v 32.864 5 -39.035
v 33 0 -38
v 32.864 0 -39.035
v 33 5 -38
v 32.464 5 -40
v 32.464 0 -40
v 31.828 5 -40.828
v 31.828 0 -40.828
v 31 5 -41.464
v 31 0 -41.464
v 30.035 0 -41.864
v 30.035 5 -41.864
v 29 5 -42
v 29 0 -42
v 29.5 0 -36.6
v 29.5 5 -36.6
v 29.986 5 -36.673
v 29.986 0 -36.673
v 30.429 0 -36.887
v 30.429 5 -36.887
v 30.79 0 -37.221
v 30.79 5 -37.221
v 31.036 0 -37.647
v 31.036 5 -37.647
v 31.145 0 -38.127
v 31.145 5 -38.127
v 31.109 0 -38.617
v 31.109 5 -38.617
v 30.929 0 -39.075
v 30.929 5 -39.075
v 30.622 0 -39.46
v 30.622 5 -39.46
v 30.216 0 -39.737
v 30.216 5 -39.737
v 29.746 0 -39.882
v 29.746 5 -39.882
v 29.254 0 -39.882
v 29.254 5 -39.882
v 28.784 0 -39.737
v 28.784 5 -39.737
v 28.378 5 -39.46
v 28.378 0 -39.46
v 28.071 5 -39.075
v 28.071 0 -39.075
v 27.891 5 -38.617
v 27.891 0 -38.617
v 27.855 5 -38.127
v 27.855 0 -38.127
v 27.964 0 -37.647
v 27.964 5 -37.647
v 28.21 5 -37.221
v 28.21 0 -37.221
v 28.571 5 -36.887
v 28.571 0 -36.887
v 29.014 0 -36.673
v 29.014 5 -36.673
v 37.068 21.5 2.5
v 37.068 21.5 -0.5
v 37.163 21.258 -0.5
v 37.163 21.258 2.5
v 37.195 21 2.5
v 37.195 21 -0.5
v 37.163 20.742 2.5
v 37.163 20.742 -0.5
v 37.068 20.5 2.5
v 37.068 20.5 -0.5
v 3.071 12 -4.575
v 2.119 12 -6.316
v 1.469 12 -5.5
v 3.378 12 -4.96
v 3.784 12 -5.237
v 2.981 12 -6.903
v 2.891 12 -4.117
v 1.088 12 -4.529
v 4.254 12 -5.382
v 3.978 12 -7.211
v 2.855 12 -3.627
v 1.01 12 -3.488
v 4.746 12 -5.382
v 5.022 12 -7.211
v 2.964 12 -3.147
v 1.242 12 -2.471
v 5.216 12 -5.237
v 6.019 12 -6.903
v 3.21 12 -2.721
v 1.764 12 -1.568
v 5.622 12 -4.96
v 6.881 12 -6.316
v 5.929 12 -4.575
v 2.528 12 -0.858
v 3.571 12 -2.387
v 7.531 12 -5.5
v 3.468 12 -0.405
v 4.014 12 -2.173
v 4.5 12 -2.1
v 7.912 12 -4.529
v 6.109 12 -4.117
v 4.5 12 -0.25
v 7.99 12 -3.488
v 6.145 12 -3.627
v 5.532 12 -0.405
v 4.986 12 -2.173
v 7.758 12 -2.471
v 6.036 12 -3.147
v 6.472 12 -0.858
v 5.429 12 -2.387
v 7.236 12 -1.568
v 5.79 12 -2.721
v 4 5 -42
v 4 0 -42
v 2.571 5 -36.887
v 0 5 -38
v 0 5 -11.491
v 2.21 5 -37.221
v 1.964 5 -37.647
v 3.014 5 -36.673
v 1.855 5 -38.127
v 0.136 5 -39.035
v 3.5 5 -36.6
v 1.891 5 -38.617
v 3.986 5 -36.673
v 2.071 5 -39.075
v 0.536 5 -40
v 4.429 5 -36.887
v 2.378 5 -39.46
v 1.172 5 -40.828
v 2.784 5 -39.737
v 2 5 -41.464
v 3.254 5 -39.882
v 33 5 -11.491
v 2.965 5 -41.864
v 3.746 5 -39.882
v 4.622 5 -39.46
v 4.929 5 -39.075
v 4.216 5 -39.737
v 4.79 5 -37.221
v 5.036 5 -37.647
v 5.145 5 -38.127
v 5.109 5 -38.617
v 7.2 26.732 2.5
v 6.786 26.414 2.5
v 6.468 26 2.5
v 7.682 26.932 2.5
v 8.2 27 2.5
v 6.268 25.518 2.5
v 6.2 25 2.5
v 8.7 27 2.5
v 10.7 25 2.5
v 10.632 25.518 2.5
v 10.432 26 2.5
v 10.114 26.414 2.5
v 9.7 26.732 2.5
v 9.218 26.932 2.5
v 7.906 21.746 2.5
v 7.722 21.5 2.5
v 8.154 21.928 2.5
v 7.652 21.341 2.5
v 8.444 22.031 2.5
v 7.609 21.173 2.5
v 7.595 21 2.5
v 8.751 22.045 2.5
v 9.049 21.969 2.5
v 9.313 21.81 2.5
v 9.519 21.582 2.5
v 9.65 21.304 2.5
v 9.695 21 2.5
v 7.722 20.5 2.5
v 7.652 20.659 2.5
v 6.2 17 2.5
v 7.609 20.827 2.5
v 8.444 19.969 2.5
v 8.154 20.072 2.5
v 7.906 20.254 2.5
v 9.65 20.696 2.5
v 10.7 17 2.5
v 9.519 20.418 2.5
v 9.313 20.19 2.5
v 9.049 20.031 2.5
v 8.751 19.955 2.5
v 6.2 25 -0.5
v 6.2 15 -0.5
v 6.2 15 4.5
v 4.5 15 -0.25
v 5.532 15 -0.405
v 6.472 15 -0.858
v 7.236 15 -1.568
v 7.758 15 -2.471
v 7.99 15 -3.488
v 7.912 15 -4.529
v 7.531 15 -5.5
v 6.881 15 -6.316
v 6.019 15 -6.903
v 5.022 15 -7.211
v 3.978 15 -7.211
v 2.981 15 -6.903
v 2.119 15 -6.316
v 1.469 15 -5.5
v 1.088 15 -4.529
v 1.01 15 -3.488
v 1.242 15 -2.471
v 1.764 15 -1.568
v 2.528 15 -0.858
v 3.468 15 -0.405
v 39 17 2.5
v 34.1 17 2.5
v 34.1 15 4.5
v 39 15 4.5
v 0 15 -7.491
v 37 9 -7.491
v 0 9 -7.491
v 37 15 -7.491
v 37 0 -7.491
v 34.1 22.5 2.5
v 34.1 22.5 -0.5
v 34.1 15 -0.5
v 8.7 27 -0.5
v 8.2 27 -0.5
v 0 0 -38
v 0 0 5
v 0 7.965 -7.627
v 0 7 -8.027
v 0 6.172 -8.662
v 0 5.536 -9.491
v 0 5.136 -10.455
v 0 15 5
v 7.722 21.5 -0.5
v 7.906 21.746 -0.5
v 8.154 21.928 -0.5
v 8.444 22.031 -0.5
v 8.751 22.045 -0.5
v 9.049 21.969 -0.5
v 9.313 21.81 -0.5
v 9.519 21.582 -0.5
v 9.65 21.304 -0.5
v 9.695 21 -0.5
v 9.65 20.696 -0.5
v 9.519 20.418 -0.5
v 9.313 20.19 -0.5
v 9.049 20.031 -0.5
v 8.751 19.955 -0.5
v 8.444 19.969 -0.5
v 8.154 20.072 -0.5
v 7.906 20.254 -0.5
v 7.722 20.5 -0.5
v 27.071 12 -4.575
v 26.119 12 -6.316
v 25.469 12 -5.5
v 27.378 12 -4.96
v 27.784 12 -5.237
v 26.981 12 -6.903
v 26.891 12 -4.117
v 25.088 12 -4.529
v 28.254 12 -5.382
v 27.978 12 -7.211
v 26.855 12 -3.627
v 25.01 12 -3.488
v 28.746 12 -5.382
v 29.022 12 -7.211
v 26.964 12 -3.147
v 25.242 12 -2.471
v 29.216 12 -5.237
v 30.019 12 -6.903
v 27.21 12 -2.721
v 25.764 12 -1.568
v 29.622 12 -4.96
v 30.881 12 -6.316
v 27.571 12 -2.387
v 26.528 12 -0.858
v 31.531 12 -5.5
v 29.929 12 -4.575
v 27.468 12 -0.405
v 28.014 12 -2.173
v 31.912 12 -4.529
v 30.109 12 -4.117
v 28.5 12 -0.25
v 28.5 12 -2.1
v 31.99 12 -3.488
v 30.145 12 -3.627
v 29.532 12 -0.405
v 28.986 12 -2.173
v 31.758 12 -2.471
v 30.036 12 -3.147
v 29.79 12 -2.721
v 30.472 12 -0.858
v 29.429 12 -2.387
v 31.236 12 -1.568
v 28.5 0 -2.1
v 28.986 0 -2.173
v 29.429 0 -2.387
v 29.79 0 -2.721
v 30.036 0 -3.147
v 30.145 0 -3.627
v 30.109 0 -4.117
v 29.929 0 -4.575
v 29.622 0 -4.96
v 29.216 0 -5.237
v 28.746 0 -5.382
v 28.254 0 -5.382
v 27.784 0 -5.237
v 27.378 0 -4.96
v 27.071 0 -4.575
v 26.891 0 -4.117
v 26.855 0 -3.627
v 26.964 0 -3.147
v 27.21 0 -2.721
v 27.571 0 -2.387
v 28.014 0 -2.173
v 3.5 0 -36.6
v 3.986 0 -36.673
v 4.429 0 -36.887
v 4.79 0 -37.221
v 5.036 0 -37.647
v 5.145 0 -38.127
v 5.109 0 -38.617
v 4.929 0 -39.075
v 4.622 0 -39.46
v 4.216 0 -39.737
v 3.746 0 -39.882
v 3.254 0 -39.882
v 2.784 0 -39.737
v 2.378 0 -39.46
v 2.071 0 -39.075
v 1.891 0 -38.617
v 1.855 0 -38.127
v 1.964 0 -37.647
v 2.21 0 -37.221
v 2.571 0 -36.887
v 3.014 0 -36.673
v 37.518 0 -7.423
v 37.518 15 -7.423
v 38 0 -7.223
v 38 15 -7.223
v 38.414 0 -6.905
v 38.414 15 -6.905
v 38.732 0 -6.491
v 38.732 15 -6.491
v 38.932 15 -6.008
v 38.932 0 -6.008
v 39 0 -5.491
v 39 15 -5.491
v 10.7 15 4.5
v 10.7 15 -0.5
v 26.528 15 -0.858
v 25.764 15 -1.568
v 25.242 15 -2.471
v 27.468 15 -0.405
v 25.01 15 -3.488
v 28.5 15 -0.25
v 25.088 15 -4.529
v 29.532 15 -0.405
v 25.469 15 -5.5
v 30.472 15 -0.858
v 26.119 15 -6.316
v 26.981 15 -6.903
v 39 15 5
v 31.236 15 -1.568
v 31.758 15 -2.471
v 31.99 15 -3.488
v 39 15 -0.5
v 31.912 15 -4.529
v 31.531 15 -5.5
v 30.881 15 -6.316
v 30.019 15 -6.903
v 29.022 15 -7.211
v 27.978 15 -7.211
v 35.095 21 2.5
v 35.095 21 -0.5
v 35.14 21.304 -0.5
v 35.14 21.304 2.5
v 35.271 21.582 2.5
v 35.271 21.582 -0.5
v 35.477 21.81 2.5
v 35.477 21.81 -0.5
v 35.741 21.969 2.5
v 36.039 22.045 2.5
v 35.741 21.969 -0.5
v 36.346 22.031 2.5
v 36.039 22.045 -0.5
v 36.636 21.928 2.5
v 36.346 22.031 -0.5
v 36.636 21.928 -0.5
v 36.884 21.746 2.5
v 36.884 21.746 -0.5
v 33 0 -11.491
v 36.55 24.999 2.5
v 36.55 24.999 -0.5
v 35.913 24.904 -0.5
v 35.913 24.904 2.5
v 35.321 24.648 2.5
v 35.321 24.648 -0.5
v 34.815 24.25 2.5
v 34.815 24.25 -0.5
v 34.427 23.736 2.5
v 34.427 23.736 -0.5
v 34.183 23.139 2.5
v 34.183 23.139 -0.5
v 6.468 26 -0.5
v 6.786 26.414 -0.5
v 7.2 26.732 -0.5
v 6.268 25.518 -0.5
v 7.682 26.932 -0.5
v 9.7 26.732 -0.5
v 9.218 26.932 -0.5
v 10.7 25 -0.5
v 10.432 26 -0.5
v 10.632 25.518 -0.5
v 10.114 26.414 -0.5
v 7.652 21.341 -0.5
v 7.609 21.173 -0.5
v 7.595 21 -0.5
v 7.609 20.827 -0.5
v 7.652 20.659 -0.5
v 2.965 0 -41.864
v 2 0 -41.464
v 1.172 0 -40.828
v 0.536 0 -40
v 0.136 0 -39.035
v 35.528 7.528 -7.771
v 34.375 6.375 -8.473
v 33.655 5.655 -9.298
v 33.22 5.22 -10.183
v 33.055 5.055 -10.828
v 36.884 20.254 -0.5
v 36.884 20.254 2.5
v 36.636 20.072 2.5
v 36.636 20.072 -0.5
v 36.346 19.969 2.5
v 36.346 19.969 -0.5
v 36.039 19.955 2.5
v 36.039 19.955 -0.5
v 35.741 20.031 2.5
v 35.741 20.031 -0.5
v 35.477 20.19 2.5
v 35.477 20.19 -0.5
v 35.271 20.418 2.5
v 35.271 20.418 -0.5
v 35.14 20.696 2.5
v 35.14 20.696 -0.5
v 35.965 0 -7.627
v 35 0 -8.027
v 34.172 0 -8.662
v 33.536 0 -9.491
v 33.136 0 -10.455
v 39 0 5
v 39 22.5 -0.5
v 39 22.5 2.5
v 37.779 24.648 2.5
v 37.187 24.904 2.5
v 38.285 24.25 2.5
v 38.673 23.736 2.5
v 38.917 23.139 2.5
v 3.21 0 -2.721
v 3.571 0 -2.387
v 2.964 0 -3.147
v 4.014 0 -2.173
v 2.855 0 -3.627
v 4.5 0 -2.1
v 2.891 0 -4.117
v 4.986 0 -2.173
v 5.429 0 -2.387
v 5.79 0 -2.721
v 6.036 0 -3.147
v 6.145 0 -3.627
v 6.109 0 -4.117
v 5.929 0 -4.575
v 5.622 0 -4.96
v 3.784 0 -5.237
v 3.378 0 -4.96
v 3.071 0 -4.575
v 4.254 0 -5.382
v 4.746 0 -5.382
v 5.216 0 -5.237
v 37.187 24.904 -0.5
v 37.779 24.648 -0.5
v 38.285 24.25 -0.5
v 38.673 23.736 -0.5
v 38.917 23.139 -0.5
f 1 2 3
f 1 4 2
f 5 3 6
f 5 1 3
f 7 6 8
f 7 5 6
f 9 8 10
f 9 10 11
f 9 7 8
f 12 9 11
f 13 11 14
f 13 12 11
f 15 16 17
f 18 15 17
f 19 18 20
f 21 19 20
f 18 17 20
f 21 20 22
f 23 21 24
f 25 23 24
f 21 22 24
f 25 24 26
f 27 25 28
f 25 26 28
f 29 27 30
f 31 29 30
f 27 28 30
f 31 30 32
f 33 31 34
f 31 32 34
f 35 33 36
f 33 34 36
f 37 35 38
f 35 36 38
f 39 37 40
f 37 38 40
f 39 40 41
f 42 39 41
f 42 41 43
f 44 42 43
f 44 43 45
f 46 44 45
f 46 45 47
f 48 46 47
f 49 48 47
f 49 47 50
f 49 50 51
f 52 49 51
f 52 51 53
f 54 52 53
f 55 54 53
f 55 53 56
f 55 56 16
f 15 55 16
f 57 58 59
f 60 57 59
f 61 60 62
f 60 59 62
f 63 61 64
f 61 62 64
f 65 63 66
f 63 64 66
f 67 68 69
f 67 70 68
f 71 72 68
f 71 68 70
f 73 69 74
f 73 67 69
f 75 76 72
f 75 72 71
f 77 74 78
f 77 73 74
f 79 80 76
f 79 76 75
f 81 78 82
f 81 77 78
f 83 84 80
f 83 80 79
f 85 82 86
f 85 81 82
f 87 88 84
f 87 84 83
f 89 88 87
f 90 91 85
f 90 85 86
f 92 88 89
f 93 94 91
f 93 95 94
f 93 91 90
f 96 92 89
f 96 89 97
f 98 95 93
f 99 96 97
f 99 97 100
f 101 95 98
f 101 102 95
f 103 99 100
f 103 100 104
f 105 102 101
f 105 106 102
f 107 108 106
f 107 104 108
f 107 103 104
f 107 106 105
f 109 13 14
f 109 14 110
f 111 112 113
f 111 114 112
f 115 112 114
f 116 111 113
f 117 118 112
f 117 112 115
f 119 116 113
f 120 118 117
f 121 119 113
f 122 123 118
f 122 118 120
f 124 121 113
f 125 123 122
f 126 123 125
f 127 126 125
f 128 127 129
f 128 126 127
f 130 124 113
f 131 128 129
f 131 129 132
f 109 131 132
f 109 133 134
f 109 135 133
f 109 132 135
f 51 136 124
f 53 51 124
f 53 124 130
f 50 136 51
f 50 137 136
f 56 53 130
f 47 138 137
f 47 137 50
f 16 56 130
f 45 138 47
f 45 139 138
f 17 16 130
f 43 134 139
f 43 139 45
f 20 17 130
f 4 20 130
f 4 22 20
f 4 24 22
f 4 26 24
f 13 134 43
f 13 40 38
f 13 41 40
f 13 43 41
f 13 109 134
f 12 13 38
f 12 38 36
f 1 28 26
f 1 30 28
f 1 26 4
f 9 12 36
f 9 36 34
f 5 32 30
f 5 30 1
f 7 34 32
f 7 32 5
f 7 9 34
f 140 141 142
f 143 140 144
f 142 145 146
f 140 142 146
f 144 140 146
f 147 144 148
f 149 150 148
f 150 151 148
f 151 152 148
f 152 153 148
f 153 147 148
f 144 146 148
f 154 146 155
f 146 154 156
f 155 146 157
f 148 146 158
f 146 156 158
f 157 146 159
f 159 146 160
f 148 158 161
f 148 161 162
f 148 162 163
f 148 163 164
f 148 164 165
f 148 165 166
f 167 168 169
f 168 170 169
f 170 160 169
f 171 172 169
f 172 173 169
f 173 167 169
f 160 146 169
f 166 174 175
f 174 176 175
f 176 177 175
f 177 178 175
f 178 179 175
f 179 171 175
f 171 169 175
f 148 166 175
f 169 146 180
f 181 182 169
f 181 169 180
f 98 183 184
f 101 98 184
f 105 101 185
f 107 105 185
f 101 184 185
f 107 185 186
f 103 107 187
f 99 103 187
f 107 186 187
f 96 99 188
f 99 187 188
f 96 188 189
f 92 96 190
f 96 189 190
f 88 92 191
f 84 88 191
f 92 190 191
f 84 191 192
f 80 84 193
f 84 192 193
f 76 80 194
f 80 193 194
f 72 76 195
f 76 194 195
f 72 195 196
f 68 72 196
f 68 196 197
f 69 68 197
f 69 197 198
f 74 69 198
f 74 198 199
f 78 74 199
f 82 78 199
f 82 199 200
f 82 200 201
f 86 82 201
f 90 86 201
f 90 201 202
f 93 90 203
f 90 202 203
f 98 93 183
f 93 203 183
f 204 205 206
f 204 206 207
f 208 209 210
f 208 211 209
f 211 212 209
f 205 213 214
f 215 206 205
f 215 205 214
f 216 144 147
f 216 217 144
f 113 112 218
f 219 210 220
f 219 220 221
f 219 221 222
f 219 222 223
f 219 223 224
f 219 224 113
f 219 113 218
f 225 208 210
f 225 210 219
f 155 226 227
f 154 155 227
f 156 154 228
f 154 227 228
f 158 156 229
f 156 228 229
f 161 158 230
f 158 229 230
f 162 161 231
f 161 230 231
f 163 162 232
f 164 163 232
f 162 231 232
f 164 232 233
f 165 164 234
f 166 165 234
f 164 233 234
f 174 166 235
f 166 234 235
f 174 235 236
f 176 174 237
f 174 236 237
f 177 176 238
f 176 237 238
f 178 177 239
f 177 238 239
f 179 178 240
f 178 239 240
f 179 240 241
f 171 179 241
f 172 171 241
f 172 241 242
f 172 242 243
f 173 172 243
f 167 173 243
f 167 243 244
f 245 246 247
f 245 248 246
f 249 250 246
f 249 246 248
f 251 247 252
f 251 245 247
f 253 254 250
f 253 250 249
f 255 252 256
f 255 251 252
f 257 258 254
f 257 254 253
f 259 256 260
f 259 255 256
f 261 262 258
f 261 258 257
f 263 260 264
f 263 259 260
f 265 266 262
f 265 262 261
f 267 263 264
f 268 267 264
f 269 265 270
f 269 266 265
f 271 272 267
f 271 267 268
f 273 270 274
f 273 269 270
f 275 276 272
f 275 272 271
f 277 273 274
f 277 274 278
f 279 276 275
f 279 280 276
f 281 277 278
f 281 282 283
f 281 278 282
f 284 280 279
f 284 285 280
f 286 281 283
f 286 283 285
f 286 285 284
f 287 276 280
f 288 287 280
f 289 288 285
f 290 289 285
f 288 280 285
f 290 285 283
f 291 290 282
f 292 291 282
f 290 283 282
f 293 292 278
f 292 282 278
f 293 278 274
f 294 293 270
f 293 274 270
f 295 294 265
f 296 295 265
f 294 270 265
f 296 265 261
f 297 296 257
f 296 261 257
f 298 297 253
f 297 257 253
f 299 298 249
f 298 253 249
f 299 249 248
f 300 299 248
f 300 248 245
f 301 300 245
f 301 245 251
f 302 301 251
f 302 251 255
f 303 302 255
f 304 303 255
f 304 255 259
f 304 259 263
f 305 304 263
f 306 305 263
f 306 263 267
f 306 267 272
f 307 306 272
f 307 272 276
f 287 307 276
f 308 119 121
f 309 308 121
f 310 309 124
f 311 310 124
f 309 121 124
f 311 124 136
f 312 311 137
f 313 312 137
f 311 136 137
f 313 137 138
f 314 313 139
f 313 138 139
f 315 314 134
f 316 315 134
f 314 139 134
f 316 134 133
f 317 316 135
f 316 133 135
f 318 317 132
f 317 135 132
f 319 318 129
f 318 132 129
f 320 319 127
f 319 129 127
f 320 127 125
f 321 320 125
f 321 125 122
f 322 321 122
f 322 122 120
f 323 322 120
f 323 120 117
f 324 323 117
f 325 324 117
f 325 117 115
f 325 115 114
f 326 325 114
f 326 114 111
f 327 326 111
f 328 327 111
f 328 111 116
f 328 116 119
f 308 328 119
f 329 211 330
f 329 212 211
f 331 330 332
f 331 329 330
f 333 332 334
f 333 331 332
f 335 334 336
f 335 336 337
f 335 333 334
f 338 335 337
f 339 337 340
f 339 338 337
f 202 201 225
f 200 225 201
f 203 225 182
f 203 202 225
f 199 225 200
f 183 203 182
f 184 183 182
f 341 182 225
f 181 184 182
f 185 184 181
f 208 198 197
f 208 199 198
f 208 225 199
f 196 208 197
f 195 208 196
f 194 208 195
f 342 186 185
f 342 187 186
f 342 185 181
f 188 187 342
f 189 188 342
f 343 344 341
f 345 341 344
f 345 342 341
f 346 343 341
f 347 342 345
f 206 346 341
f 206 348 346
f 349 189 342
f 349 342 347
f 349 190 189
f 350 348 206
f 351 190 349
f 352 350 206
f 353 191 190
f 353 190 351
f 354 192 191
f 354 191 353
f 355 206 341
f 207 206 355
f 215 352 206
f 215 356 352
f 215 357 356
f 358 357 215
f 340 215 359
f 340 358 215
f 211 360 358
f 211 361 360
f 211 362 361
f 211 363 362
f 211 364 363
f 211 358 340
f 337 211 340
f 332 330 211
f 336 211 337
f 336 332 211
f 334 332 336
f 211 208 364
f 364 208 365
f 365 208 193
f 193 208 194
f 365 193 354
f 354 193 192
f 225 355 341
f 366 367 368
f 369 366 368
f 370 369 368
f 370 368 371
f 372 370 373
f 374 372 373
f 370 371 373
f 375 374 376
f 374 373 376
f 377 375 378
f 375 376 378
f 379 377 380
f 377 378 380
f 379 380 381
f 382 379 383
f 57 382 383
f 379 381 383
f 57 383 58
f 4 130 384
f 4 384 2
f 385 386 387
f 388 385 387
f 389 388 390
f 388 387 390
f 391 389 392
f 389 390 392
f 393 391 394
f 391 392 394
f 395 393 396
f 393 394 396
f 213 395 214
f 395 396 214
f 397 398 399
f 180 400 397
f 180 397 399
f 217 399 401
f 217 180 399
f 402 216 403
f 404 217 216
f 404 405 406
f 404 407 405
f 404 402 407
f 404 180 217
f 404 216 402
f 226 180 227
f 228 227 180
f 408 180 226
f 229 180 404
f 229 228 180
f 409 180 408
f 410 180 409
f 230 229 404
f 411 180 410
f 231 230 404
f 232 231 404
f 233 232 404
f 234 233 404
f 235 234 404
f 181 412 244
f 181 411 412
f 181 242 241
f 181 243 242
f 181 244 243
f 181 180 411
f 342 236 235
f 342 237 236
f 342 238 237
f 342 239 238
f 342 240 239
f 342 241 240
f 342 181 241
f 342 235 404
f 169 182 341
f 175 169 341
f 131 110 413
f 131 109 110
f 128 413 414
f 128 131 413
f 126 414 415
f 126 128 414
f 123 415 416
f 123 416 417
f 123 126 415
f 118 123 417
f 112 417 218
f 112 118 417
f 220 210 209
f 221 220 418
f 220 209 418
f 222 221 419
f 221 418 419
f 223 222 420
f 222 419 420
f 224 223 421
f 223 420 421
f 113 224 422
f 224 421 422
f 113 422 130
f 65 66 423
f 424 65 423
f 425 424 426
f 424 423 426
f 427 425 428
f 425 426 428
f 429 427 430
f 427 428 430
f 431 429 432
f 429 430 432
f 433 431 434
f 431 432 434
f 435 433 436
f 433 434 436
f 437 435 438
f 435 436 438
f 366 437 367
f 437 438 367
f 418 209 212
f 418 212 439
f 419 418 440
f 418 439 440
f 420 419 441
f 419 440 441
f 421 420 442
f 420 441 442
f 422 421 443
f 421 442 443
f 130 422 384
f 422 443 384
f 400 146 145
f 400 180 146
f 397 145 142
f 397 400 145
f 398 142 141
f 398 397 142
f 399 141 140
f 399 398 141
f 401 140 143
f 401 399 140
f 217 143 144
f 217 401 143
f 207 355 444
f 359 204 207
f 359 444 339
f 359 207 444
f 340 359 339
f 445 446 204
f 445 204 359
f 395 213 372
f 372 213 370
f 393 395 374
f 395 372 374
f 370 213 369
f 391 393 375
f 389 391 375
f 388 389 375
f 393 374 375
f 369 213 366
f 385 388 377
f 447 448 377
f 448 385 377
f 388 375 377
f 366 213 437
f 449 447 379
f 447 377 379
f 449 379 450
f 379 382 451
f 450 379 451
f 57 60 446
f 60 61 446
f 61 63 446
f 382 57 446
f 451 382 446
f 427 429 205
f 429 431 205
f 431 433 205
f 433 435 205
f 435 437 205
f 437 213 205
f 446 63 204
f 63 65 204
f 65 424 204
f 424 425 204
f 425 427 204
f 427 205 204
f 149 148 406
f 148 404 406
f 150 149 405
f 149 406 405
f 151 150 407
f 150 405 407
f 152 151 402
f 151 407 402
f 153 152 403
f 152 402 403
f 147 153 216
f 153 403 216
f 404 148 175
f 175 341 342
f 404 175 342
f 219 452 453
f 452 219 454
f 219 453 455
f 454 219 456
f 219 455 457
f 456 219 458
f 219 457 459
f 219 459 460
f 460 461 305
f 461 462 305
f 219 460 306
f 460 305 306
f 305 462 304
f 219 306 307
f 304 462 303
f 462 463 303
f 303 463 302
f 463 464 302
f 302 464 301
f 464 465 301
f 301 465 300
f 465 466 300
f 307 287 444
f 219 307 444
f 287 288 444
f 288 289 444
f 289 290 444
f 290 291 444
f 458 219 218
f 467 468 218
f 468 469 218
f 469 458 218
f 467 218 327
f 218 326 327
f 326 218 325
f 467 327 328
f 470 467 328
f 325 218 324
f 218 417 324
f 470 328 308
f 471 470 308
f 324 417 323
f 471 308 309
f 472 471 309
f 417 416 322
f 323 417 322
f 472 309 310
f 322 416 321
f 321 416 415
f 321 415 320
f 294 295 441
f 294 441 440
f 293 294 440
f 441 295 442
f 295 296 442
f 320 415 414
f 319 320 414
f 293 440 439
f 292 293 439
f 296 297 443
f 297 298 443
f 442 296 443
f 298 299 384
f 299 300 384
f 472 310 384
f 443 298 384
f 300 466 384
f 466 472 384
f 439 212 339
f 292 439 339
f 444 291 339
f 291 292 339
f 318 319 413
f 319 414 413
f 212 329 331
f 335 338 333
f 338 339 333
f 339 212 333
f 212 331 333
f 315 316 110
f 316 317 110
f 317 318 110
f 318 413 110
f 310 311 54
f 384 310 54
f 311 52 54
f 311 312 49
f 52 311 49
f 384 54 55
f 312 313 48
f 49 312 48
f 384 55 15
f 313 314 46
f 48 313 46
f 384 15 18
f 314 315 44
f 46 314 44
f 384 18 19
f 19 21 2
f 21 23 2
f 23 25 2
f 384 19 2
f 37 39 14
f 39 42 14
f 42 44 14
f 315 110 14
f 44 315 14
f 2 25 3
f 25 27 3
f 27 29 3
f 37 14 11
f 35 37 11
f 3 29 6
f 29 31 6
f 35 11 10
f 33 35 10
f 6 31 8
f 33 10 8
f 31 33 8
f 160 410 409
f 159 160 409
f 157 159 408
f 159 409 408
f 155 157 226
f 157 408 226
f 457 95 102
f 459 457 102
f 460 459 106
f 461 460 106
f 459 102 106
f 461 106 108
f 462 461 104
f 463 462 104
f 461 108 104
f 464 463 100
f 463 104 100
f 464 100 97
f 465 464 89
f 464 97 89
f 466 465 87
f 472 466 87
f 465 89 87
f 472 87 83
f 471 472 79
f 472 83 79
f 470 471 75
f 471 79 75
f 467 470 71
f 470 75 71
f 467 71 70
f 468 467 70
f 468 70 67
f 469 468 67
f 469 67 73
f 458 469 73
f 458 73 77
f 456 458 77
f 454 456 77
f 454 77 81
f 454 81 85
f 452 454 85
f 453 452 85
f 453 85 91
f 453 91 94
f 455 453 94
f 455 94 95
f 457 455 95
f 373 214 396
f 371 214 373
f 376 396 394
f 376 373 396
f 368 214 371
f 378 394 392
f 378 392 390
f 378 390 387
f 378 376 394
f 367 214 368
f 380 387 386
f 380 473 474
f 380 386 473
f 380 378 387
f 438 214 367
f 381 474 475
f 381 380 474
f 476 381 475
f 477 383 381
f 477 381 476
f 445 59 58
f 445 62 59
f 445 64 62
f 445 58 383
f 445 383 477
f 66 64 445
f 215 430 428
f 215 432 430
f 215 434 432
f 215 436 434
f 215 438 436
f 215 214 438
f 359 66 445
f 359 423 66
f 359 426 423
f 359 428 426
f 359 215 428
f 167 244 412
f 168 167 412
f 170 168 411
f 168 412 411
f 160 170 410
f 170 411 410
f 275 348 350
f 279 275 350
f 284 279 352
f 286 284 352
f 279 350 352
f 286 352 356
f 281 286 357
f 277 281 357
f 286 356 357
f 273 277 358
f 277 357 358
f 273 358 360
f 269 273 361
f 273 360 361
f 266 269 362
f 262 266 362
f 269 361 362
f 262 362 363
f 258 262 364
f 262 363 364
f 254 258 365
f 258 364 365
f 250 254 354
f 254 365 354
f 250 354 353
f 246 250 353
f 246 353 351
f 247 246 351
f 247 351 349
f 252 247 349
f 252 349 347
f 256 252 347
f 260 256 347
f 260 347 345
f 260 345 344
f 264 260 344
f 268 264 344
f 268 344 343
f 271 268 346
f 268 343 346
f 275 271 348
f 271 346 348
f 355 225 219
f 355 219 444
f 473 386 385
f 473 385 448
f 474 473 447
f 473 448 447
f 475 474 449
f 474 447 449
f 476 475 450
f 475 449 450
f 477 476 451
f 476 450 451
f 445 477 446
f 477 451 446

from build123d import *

# Parameters (mm, degrees)
SKETCH1_W           = 33
SKETCH1_H           = 42
BOSS_EXTRUDE1_DEPTH = 5
SKETCH4_R           = 1.65
CUT_EXTRUDE1_DEPTH  = 10
SKETCH6_W           = 6
SKETCH6_H           = 7.490694283
BOSS_EXTRUDE2_DEPTH = 5
BOSS_EXTRUDE4_START = 10
SKETCH8_R           = 1.65
BOSS_EXTRUDE4_DEPTH = 10
SKETCH9_W           = 4.9
SKETCH9_H           = 3
BOSS_EXTRUDE5_DEPTH = 10
FILLET2_R           = 2.5
CUT_EXTRUDE3_DEPTH  = 10
SKETCH11_W          = 33
SKETCH11_H          = 34.509305717
CUT_EXTRUDE4_DEPTH  = 10
FILLET3_R           = 4
FILLET4_R           = 2
FILLET5_R           = 4
SKETCH12_R          = 3.5
CUT_EXTRUDE5_DEPTH  = 3
SKETCH13_W          = 4.5
SKETCH13_H          = 3
BOSS_EXTRUDE6_DEPTH = 12
FILLET6_R           = 2
CUT_EXTRUDE6_DEPTH  = 7
CHAMFER1_SIZE       = 2


# Some blends are built 0.0001 mm under size
with BuildPart() as part:
    # Sketch1 → Boss-Extrude1 (new body)
    with BuildSketch(Plane(origin=(0, 0, 0), x_dir=(1, 0, 0), z_dir=(0, 1, 0))):
        with Locations((16.5, 21)):
            Rectangle(SKETCH1_W, SKETCH1_H)
    extrude(amount=BOSS_EXTRUDE1_DEPTH)

    # Sketch4 → Cut-Extrude1 (cut)
    with BuildSketch(Plane(origin=(0, 5, 0), x_dir=(1, 0, 0), z_dir=(0, 1, 0))):
        with Locations(Location((4.500000179, 3.75, 0), (0, 0, 270))):
            Circle(SKETCH4_R)
        with Locations(Location((3.500000179, 38.249999434, 0), (0, 0, 270))):
            Circle(SKETCH4_R)
        with Locations(Location((29.5, 38.249999434, 0), (0, 0, 270))):
            Circle(SKETCH4_R)
        with Locations(Location((28.5, 3.75, 0), (0, 0, 270))):
            Circle(SKETCH4_R)
    extrude(amount=-CUT_EXTRUDE1_DEPTH, mode=Mode.SUBTRACT)

    # Sketch6 → Boss-Extrude2 (add)
    with BuildSketch(Plane(origin=(0, 5, 0), x_dir=(1, 0, 0), z_dir=(0, 1, 0))):
        with Locations((36, 3.745347142)):
            Rectangle(SKETCH6_W, SKETCH6_H)
        Polygon((0, -5), (0, 0), (33, 0), (39, 0), (39, -5), align=None)
    extrude(amount=-BOSS_EXTRUDE2_DEPTH)

    # Sketch8 → Boss-Extrude4 (add)
    with BuildSketch(Plane(origin=(0, 5, 0), x_dir=(1, 0, 0), z_dir=(0, 1, 0)).offset(BOSS_EXTRUDE4_START)):
        Polygon((39, 7.490694283), (33, 7.490694283), (33, 42), (0, 42), (0, -5), (39, -5), align=None)
        with Locations(Location((29.5, 38.249999434, 0), (0, 0, 270))):
            Circle(SKETCH8_R, mode=Mode.SUBTRACT)
        with Locations(Location((3.500000179, 38.249999434, 0), (0, 0, 270))):
            Circle(SKETCH8_R, mode=Mode.SUBTRACT)
        with Locations(Location((4.500000179, 3.75, 0), (0, 0, 270))):
            Circle(SKETCH8_R, mode=Mode.SUBTRACT)
        with Locations(Location((28.5, 3.75, 0), (0, 0, 270))):
            Circle(SKETCH8_R, mode=Mode.SUBTRACT)
    extrude(amount=-BOSS_EXTRUDE4_DEPTH)

    # Sketch9 → Boss-Extrude5 (add)
    with BuildSketch(Plane(origin=(0, 15, 0), x_dir=(1, 0, 0), z_dir=(0, 1, 0))):
        with Locations((36.55, -1)):
            Rectangle(SKETCH9_W, SKETCH9_H)
    extrude(amount=BOSS_EXTRUDE5_DEPTH)

    # Fillet2
    # the kernel refuses this fillet: 2.5 mm, written as the material it takes off along each edge
    with BuildSketch(Plane(origin=(34.1, 25, -6.75), x_dir=(0, -1, 0), z_dir=(0, 0, 1)), Plane(origin=(39, 25, 8.75), x_dir=(0, -1, 0), z_dir=(0, 0, -1))) as fillet2_piece_1:
        with BuildLine():
            CenterArc((FILLET2_R, FILLET2_R), FILLET2_R, 180, 90)
            Line((0, FILLET2_R), (0, 0))
            Line((0, 0), (FILLET2_R, 0))
        make_face()
    extrude(amount=15.5, mode=Mode.SUBTRACT)

    # Sketch10 → Cut-Extrude3 (cut)
    with BuildSketch(Plane(origin=(0, 0, -0.5), x_dir=(-1, 0, 0), z_dir=(0, 0, -1))):
        with BuildLine():
            ThreePointArc((-37.068227721, 21.5), (-37.194918455, 21), (-37.068227721, 20.5))
            ThreePointArc((-37.068227721, 20.5), (-35.887018018, 19.982165355), (-35.094918455, 21))
            ThreePointArc((-35.094918455, 21), (-35.887018018, 22.017834645), (-37.068227721, 21.5))
        make_face()
    extrude(amount=-CUT_EXTRUDE3_DEPTH, mode=Mode.SUBTRACT)

    # Sketch11 → Cut-Extrude4 (cut)
    with BuildSketch(Plane(origin=(0, 15, 0), x_dir=(1, 0, 0), z_dir=(0, 1, 0))):
        with Locations((16.5, 24.745347142)):
            Rectangle(SKETCH11_W, SKETCH11_H)
    extrude(amount=-CUT_EXTRUDE4_DEPTH, mode=Mode.SUBTRACT)

    # Fillet3
    fillet3_edges = [part.edges().sort_by_distance(p)[0] for p in [
        (0, 2.5, -42),
        (33, 2.5, -42),
        (33, 2.5, -7.490694283),
    ]]
    fillet(fillet3_edges, radius=FILLET3_R)

    # Fillet4
    fillet4_edges = [part.edges().sort_by_distance(p)[0] for p in [
        (39, 7.5, -7.490694283),
    ]]
    fillet(fillet4_edges, radius=FILLET4_R - 0.0001)  # a hair under: the kernel refuses the full size

    # Fillet5
    fillet5_edges = [part.edges().sort_by_distance(p)[0] for p in [
        (18.5, 5, -7.490694283),
    ]]
    fillet(fillet5_edges, radius=FILLET5_R)

    # Sketch12 → Cut-Extrude5 (cut)
    with BuildSketch(Plane(origin=(0, 15, 0), x_dir=(1, 0, 0), z_dir=(0, 1, 0))):
        with Locations(Location((4.500000179, 3.75, 0), (0, 0, 270))):
            Circle(SKETCH12_R)
        with Locations(Location((28.5, 3.75, 0), (0, 0, 270))):
            Circle(SKETCH12_R)
    extrude(amount=-CUT_EXTRUDE5_DEPTH, mode=Mode.SUBTRACT)

    # Sketch13 → Boss-Extrude6 (add)
    with BuildSketch(Plane(origin=(0, 15, 0), x_dir=(1, 0, 0), z_dir=(0, 1, 0))):
        with Locations((8.45, -1)):
            Rectangle(SKETCH13_W, SKETCH13_H)
    extrude(amount=BOSS_EXTRUDE6_DEPTH)

    # Fillet6
    fillet6_edges = [part.edges().sort_by_distance(p)[0] for p in [
        (6.2, 27, 1),
        (10.7, 27, 1),
    ]]
    fillet(fillet6_edges, radius=FILLET6_R)

    # Sketch14 → Cut-Extrude6 (cut)
    with BuildSketch(Plane(origin=(0, 0, -0.5), x_dir=(-1, 0, 0), z_dir=(0, 0, -1))):
        with BuildLine():
            ThreePointArc((-7.594918455, 21), (-7.62708381, 21.257900437), (-7.721609189, 21.5))
            ThreePointArc((-7.721609189, 21.5), (-9.694918455, 21), (-7.721609189, 20.5))
            ThreePointArc((-7.721609189, 20.5), (-7.62708381, 20.742099563), (-7.594918455, 21))
        make_face()
    extrude(amount=-CUT_EXTRUDE6_DEPTH, mode=Mode.SUBTRACT)

    # Chamfer1
    chamfer1_edges = [part.edges().sort_by_distance(p)[0] for p in [
        (8.45, 15, 2.5),
        (36.55, 15, 2.5),
    ]]
    chamfer(chamfer1_edges, length=CHAMFER1_SIZE)


solid = part.part
